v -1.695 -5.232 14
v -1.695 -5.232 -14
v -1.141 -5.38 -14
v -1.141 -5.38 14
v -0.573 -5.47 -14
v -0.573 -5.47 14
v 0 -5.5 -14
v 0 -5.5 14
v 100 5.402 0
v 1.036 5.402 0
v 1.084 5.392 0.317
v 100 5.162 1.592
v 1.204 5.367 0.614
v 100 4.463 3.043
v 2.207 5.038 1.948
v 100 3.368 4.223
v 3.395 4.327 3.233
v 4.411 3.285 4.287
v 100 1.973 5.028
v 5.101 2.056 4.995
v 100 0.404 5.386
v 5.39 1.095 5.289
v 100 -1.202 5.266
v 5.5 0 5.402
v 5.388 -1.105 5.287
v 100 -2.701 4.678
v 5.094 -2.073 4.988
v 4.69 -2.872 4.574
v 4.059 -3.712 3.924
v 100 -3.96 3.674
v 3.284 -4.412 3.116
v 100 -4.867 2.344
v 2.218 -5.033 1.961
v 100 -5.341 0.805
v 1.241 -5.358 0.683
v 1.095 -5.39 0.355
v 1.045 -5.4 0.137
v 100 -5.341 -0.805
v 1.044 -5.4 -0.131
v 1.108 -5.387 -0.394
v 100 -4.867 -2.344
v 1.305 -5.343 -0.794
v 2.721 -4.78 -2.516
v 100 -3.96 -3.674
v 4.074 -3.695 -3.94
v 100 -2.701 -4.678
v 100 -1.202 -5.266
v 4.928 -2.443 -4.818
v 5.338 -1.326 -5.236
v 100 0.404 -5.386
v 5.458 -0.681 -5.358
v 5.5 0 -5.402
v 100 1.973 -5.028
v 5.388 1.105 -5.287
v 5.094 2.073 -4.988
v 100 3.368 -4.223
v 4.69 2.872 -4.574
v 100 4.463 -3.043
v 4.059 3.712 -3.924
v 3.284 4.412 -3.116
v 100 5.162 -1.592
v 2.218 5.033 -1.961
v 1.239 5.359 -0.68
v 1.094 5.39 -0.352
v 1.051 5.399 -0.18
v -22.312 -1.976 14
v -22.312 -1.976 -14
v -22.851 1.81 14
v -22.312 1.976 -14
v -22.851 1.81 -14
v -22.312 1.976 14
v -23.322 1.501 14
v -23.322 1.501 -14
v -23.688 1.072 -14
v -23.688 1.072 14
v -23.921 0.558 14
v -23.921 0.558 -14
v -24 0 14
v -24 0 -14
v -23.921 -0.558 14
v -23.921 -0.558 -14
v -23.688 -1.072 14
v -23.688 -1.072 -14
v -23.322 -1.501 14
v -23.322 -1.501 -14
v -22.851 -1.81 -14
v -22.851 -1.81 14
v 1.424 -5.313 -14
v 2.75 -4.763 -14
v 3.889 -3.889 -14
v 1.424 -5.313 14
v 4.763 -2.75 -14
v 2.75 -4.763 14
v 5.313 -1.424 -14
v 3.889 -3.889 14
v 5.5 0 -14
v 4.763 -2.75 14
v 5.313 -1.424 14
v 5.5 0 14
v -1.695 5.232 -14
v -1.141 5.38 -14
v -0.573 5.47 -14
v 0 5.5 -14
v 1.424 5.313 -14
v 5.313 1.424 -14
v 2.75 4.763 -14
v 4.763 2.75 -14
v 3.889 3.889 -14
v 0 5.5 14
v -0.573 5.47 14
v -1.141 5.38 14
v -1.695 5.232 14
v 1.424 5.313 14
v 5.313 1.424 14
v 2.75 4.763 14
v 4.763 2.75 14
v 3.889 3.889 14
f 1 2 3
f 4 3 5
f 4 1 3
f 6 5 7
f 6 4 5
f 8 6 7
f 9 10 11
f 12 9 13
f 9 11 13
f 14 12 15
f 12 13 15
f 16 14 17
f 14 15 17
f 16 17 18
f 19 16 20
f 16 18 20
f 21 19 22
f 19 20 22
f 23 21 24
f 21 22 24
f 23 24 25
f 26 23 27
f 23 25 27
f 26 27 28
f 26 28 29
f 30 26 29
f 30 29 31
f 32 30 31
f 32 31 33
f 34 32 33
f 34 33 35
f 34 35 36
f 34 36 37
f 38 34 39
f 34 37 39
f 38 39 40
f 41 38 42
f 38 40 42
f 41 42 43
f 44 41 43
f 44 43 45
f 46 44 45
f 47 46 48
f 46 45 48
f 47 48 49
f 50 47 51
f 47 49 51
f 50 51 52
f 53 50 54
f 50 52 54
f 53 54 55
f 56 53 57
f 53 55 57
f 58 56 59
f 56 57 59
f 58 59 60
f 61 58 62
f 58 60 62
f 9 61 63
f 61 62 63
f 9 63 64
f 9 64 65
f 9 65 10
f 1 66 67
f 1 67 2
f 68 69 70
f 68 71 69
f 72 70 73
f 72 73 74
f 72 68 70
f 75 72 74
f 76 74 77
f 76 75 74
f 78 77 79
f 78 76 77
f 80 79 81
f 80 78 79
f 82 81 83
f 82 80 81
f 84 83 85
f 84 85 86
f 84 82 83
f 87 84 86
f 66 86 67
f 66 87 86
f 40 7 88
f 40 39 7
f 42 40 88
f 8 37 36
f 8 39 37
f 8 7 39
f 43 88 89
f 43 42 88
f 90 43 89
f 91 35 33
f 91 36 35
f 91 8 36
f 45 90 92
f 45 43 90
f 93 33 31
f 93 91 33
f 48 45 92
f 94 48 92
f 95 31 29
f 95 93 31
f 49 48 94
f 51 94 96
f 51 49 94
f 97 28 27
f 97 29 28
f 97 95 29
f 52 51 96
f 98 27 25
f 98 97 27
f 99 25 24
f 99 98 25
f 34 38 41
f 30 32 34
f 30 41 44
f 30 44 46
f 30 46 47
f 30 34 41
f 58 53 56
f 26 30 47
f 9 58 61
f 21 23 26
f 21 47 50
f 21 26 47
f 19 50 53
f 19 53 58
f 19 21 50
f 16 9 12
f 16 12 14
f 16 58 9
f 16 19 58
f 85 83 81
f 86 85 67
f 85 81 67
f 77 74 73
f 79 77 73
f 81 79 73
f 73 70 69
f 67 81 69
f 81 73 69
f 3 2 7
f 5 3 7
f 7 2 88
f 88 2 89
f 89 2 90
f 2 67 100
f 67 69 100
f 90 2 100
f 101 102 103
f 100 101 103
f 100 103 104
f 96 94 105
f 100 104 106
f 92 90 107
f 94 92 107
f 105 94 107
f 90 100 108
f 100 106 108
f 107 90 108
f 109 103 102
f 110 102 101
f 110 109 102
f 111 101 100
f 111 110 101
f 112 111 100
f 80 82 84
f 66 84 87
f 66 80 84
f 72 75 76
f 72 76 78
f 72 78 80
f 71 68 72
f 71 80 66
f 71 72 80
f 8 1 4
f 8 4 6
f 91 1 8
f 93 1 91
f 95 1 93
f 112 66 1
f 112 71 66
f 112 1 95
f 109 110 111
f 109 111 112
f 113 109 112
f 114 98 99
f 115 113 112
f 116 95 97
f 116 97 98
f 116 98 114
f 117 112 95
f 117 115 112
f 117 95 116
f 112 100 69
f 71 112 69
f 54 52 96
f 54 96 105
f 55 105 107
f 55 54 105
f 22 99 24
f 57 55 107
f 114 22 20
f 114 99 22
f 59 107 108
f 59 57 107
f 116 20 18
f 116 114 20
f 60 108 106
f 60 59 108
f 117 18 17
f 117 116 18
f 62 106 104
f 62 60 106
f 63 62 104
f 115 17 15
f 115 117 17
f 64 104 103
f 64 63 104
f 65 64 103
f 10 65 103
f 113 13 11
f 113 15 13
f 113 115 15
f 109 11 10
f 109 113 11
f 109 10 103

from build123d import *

# Parameters (mm, degrees)
F1_DEPTH      = 14
F1_DEPTH_BACK = 14
F2_R          = 5.401545
F3_DEPTH      = 100


with BuildPart() as f1:
    # F0 (on Top) → F1 (new body, two sides)
    with BuildSketch(Plane.XY) as f1_sk:
        with BuildLine():
            ThreePointArc((-22.312058, -1.975505), (-20.700792, -1.520545), (-20, 0))
            ThreePointArc((-20, 0), (-20.700792, 1.520545), (-22.312058, 1.975505))
            ThreePointArc((-22.312058, 1.975505), (-24, 0), (-22.312058, -1.975505))
        make_face()
        with BuildLine():
            ThreePointArc((-22.312058, 1.975505), (-20.700792, 1.520545), (-20, 0))
            ThreePointArc((-20, 0), (-20.700792, -1.520545), (-22.312058, -1.975505))
            Line((-22.312058, -1.975505), (-1.695299, -5.232204))
            ThreePointArc((-1.695299, -5.232204), (-5.5, 0), (-1.695299, 5.232204))
            Line((-1.695299, 5.232204), (-22.312058, 1.975505))
        make_face()
        with BuildLine():
            Line((0, 5.5), (-1.695299, 5.232204))
            ThreePointArc((-1.695299, 5.232204), (-5.5, 0), (-1.695299, -5.232204))
            Line((-1.695299, -5.232204), (0, -5.5))
            ThreePointArc((0, -5.5), (3.889087, -3.889087), (5.5, 0))
            ThreePointArc((5.5, 0), (3.889087, 3.889087), (0, 5.5))
        make_face()
        with BuildLine():
            ThreePointArc((0, 5.5), (-0.85816, 5.432639), (-1.695299, 5.232204))
            Line((-1.695299, 5.232204), (0, 5.5))
        make_face()
        with BuildLine():
            Line((0, -5.5), (-1.695299, -5.232204))
            ThreePointArc((-1.695299, -5.232204), (-0.85816, -5.432639), (0, -5.5))
        make_face()
    extrude(amount=F1_DEPTH)
    extrude(f1_sk.sketch, amount=-F1_DEPTH_BACK)

    # F2 (on Right) → F3 (join)
    with BuildSketch(Plane.YZ):
        Circle(F2_R)
    extrude(amount=F3_DEPTH)


solid = f1.part
